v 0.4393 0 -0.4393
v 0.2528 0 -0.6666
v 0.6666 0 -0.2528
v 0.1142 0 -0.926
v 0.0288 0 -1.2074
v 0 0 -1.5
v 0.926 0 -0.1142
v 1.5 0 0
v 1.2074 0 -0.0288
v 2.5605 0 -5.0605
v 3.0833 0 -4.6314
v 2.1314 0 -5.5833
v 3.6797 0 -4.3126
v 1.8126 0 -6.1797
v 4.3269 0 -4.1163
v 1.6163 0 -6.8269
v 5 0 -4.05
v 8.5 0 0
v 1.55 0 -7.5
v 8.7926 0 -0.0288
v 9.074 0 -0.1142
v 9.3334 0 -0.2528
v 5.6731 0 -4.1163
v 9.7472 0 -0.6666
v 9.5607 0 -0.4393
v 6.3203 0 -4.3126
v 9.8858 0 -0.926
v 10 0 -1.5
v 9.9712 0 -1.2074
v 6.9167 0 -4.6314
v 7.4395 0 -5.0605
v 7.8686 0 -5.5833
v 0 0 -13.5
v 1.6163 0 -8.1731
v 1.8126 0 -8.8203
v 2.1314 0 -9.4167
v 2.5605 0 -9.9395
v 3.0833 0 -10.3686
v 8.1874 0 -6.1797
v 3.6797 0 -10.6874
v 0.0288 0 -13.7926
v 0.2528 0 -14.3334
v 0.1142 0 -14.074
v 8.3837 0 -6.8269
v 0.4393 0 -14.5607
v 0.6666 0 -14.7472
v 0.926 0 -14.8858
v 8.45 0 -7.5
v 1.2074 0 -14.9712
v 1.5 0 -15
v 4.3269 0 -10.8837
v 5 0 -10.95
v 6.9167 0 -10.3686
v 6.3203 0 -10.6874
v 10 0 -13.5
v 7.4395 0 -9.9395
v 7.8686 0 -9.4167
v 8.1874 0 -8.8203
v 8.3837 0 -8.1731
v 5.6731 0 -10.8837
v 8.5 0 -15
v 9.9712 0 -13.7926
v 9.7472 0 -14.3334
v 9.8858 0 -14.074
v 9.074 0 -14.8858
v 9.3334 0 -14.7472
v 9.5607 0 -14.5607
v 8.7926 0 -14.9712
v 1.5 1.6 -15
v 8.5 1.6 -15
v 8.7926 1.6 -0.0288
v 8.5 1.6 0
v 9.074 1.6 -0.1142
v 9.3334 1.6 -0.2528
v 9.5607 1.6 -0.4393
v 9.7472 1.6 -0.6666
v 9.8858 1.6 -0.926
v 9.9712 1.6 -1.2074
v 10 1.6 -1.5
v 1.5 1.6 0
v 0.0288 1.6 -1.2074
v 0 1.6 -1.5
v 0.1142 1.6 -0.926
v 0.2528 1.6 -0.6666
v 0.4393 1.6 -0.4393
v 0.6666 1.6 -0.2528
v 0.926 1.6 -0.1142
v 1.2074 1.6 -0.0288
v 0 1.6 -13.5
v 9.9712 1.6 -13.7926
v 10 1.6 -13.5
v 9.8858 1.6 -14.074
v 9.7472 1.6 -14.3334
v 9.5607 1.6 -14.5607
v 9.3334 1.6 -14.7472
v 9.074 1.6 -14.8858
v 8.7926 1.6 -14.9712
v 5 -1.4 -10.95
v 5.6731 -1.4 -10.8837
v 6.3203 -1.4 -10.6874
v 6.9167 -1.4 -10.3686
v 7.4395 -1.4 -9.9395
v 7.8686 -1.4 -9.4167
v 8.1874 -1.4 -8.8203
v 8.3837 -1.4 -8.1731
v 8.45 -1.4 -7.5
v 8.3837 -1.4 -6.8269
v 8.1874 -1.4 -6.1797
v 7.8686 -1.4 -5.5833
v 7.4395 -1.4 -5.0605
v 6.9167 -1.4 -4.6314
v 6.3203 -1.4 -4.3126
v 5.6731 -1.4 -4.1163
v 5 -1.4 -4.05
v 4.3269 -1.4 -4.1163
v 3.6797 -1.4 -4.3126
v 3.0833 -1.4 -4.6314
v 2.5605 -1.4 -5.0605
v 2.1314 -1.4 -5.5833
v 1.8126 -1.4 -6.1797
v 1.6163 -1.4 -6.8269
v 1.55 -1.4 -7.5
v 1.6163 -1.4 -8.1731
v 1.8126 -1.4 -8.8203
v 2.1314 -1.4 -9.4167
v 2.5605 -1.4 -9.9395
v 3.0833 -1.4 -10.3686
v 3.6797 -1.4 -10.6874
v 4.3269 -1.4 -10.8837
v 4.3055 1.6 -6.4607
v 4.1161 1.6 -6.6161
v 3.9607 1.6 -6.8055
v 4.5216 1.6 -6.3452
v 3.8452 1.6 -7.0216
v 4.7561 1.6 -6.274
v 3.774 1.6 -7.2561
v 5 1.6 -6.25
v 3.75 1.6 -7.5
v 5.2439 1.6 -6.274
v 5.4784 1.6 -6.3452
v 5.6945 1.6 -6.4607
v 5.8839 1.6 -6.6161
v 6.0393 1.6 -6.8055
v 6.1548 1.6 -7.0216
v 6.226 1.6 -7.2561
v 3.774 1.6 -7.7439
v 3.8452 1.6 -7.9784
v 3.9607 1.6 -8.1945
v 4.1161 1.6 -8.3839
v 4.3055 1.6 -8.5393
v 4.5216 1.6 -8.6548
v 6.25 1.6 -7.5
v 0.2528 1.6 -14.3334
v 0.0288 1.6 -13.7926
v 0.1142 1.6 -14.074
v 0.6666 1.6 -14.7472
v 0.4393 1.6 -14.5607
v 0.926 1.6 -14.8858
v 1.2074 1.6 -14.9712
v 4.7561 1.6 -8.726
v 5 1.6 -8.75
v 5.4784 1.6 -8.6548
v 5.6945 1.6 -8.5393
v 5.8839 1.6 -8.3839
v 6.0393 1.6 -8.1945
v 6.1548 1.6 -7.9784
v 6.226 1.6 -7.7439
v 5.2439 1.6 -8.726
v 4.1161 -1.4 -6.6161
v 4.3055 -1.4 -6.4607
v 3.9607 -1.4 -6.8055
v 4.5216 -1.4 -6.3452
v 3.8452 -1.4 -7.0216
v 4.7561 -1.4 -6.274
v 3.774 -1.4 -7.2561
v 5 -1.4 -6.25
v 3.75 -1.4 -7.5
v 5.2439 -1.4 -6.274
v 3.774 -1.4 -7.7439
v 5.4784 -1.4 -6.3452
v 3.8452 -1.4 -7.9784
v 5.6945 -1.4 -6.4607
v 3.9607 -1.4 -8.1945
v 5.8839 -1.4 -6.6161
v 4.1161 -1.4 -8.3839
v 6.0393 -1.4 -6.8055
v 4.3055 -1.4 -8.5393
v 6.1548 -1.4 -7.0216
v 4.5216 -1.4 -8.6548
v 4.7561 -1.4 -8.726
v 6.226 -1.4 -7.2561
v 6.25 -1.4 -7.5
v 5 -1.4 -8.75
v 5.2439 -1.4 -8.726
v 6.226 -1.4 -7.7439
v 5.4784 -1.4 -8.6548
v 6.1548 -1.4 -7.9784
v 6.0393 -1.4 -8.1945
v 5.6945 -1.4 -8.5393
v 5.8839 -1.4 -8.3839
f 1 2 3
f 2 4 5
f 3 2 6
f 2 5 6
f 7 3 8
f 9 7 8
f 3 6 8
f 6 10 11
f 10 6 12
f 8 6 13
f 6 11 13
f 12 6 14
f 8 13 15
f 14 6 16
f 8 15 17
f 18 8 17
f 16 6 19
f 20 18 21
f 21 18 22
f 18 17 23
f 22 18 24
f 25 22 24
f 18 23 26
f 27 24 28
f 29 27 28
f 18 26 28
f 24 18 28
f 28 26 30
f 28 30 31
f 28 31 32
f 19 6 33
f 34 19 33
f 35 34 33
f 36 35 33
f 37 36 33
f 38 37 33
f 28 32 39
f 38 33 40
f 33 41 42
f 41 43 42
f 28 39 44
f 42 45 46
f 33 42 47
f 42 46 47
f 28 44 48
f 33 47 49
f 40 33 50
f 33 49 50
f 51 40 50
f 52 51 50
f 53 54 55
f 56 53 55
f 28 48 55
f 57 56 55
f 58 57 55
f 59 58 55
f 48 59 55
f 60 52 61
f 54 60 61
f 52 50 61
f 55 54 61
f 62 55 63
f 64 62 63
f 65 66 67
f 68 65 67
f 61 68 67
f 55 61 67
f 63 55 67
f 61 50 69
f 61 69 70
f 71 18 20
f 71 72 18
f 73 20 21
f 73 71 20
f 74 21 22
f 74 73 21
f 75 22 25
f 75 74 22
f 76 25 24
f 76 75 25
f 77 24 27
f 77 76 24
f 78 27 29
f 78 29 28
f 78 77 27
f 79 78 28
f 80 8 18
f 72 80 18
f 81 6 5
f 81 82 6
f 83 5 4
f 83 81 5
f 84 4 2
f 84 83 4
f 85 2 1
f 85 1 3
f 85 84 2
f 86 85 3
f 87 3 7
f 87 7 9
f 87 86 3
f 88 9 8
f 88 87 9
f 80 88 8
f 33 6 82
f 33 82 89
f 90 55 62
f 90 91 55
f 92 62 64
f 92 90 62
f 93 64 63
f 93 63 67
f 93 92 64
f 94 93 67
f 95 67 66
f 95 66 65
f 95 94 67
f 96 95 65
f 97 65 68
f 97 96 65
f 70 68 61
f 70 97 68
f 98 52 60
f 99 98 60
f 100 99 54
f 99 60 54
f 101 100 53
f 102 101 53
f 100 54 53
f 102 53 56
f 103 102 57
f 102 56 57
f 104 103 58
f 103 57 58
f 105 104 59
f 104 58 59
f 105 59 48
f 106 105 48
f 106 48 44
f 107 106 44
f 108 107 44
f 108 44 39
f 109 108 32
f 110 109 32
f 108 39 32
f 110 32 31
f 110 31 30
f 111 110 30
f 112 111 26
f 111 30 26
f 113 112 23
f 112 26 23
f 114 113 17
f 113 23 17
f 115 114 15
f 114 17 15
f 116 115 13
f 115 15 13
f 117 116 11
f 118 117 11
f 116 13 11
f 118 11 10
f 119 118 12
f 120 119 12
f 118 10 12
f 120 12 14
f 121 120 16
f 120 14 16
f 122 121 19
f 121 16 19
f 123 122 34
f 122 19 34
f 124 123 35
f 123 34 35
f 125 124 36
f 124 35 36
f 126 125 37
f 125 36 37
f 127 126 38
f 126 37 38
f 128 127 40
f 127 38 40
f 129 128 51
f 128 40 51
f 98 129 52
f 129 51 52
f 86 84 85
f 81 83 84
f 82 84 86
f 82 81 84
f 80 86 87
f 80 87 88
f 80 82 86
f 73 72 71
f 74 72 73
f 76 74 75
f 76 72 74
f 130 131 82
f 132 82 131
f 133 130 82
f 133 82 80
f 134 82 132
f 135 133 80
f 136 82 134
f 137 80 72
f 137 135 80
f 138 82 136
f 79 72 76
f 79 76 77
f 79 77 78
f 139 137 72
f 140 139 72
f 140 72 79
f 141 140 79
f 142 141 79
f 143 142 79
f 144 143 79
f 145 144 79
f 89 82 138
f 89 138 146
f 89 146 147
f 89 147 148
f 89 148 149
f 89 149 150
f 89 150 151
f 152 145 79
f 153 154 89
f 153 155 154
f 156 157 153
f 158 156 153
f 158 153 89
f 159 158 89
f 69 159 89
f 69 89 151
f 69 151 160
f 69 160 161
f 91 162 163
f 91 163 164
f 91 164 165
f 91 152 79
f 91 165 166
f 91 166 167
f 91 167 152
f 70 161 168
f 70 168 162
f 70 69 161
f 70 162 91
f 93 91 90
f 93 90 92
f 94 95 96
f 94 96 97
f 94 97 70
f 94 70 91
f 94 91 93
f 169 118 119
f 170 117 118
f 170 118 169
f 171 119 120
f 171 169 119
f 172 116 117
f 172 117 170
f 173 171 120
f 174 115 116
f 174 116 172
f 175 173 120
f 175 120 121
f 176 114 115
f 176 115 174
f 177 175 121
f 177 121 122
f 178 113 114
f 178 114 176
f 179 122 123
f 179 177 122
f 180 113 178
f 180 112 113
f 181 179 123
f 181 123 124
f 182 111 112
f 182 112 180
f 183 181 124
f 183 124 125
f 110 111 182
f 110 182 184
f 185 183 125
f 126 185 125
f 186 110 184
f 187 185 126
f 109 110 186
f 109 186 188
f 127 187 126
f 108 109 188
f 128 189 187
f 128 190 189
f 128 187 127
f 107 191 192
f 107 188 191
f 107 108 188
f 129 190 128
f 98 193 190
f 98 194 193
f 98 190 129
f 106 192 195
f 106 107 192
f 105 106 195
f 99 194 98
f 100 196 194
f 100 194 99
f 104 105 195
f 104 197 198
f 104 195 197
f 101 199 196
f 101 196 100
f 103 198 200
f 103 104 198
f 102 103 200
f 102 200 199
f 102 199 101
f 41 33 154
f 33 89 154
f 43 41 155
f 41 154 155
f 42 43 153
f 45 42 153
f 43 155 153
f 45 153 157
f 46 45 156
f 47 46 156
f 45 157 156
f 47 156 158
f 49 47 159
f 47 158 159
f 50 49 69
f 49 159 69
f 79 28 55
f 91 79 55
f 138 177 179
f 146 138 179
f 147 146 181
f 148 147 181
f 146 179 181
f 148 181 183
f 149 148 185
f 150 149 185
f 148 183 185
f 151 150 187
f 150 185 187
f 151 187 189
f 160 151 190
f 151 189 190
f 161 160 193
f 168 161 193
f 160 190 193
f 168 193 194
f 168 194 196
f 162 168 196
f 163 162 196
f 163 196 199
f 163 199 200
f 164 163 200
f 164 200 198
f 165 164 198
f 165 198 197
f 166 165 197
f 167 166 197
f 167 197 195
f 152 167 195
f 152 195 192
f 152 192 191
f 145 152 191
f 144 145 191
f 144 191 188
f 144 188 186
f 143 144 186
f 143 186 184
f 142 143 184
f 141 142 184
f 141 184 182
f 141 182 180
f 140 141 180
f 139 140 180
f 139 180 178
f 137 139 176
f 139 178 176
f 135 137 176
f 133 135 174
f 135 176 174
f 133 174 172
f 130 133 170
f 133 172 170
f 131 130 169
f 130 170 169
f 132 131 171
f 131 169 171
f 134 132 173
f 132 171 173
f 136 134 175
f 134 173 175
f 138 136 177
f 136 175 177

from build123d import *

# Parameters (mm, degrees)
SKETCH1_W             = 10
SKETCH1_H             = 15
BOSS_EXTRUDE1_DEPTH   = 1.6
FILLET1_R             = 1.5
SKETCH2_R             = 3.45
BOSS_EXTRUDE2_DEPTH   = 1.4
M3X0_5_TAPPED_HOLE1_D = 2.5


with BuildPart() as part:
    # Sketch1 → Boss-Extrude1 (new body)
    with BuildSketch(Plane(origin=(0, 0, 0), x_dir=(1, 0, 0), z_dir=(0, 1, 0))):
        with Locations((5, 7.5)):
            Rectangle(SKETCH1_W, SKETCH1_H)
    extrude(amount=BOSS_EXTRUDE1_DEPTH)

    # Fillet1
    fillet1_edges = [part.edges().sort_by_distance(p)[0] for p in [
        (0, 0.8, -15),
        (10, 0.8, -15),
        (10, 0.8, 0),
        (0, 0.8, 0),
    ]]
    fillet(fillet1_edges, radius=FILLET1_R)

    # Sketch2 → Boss-Extrude2 (add)
    with BuildSketch(Plane.XZ):
        with Locations(Location((5, -7.5, 0), (0, 0, 270))):
            Circle(SKETCH2_R)
    extrude(amount=BOSS_EXTRUDE2_DEPTH)

    # M3x0.5 Tapped Hole1 (through all)
    with Locations(Plane(origin=(0, 1.6, 0), x_dir=(1, 0, 0), z_dir=(0, 1, 0))):
        with Locations((5, 7.5)):
            Hole(M3X0_5_TAPPED_HOLE1_D / 2)


solid = part.part
